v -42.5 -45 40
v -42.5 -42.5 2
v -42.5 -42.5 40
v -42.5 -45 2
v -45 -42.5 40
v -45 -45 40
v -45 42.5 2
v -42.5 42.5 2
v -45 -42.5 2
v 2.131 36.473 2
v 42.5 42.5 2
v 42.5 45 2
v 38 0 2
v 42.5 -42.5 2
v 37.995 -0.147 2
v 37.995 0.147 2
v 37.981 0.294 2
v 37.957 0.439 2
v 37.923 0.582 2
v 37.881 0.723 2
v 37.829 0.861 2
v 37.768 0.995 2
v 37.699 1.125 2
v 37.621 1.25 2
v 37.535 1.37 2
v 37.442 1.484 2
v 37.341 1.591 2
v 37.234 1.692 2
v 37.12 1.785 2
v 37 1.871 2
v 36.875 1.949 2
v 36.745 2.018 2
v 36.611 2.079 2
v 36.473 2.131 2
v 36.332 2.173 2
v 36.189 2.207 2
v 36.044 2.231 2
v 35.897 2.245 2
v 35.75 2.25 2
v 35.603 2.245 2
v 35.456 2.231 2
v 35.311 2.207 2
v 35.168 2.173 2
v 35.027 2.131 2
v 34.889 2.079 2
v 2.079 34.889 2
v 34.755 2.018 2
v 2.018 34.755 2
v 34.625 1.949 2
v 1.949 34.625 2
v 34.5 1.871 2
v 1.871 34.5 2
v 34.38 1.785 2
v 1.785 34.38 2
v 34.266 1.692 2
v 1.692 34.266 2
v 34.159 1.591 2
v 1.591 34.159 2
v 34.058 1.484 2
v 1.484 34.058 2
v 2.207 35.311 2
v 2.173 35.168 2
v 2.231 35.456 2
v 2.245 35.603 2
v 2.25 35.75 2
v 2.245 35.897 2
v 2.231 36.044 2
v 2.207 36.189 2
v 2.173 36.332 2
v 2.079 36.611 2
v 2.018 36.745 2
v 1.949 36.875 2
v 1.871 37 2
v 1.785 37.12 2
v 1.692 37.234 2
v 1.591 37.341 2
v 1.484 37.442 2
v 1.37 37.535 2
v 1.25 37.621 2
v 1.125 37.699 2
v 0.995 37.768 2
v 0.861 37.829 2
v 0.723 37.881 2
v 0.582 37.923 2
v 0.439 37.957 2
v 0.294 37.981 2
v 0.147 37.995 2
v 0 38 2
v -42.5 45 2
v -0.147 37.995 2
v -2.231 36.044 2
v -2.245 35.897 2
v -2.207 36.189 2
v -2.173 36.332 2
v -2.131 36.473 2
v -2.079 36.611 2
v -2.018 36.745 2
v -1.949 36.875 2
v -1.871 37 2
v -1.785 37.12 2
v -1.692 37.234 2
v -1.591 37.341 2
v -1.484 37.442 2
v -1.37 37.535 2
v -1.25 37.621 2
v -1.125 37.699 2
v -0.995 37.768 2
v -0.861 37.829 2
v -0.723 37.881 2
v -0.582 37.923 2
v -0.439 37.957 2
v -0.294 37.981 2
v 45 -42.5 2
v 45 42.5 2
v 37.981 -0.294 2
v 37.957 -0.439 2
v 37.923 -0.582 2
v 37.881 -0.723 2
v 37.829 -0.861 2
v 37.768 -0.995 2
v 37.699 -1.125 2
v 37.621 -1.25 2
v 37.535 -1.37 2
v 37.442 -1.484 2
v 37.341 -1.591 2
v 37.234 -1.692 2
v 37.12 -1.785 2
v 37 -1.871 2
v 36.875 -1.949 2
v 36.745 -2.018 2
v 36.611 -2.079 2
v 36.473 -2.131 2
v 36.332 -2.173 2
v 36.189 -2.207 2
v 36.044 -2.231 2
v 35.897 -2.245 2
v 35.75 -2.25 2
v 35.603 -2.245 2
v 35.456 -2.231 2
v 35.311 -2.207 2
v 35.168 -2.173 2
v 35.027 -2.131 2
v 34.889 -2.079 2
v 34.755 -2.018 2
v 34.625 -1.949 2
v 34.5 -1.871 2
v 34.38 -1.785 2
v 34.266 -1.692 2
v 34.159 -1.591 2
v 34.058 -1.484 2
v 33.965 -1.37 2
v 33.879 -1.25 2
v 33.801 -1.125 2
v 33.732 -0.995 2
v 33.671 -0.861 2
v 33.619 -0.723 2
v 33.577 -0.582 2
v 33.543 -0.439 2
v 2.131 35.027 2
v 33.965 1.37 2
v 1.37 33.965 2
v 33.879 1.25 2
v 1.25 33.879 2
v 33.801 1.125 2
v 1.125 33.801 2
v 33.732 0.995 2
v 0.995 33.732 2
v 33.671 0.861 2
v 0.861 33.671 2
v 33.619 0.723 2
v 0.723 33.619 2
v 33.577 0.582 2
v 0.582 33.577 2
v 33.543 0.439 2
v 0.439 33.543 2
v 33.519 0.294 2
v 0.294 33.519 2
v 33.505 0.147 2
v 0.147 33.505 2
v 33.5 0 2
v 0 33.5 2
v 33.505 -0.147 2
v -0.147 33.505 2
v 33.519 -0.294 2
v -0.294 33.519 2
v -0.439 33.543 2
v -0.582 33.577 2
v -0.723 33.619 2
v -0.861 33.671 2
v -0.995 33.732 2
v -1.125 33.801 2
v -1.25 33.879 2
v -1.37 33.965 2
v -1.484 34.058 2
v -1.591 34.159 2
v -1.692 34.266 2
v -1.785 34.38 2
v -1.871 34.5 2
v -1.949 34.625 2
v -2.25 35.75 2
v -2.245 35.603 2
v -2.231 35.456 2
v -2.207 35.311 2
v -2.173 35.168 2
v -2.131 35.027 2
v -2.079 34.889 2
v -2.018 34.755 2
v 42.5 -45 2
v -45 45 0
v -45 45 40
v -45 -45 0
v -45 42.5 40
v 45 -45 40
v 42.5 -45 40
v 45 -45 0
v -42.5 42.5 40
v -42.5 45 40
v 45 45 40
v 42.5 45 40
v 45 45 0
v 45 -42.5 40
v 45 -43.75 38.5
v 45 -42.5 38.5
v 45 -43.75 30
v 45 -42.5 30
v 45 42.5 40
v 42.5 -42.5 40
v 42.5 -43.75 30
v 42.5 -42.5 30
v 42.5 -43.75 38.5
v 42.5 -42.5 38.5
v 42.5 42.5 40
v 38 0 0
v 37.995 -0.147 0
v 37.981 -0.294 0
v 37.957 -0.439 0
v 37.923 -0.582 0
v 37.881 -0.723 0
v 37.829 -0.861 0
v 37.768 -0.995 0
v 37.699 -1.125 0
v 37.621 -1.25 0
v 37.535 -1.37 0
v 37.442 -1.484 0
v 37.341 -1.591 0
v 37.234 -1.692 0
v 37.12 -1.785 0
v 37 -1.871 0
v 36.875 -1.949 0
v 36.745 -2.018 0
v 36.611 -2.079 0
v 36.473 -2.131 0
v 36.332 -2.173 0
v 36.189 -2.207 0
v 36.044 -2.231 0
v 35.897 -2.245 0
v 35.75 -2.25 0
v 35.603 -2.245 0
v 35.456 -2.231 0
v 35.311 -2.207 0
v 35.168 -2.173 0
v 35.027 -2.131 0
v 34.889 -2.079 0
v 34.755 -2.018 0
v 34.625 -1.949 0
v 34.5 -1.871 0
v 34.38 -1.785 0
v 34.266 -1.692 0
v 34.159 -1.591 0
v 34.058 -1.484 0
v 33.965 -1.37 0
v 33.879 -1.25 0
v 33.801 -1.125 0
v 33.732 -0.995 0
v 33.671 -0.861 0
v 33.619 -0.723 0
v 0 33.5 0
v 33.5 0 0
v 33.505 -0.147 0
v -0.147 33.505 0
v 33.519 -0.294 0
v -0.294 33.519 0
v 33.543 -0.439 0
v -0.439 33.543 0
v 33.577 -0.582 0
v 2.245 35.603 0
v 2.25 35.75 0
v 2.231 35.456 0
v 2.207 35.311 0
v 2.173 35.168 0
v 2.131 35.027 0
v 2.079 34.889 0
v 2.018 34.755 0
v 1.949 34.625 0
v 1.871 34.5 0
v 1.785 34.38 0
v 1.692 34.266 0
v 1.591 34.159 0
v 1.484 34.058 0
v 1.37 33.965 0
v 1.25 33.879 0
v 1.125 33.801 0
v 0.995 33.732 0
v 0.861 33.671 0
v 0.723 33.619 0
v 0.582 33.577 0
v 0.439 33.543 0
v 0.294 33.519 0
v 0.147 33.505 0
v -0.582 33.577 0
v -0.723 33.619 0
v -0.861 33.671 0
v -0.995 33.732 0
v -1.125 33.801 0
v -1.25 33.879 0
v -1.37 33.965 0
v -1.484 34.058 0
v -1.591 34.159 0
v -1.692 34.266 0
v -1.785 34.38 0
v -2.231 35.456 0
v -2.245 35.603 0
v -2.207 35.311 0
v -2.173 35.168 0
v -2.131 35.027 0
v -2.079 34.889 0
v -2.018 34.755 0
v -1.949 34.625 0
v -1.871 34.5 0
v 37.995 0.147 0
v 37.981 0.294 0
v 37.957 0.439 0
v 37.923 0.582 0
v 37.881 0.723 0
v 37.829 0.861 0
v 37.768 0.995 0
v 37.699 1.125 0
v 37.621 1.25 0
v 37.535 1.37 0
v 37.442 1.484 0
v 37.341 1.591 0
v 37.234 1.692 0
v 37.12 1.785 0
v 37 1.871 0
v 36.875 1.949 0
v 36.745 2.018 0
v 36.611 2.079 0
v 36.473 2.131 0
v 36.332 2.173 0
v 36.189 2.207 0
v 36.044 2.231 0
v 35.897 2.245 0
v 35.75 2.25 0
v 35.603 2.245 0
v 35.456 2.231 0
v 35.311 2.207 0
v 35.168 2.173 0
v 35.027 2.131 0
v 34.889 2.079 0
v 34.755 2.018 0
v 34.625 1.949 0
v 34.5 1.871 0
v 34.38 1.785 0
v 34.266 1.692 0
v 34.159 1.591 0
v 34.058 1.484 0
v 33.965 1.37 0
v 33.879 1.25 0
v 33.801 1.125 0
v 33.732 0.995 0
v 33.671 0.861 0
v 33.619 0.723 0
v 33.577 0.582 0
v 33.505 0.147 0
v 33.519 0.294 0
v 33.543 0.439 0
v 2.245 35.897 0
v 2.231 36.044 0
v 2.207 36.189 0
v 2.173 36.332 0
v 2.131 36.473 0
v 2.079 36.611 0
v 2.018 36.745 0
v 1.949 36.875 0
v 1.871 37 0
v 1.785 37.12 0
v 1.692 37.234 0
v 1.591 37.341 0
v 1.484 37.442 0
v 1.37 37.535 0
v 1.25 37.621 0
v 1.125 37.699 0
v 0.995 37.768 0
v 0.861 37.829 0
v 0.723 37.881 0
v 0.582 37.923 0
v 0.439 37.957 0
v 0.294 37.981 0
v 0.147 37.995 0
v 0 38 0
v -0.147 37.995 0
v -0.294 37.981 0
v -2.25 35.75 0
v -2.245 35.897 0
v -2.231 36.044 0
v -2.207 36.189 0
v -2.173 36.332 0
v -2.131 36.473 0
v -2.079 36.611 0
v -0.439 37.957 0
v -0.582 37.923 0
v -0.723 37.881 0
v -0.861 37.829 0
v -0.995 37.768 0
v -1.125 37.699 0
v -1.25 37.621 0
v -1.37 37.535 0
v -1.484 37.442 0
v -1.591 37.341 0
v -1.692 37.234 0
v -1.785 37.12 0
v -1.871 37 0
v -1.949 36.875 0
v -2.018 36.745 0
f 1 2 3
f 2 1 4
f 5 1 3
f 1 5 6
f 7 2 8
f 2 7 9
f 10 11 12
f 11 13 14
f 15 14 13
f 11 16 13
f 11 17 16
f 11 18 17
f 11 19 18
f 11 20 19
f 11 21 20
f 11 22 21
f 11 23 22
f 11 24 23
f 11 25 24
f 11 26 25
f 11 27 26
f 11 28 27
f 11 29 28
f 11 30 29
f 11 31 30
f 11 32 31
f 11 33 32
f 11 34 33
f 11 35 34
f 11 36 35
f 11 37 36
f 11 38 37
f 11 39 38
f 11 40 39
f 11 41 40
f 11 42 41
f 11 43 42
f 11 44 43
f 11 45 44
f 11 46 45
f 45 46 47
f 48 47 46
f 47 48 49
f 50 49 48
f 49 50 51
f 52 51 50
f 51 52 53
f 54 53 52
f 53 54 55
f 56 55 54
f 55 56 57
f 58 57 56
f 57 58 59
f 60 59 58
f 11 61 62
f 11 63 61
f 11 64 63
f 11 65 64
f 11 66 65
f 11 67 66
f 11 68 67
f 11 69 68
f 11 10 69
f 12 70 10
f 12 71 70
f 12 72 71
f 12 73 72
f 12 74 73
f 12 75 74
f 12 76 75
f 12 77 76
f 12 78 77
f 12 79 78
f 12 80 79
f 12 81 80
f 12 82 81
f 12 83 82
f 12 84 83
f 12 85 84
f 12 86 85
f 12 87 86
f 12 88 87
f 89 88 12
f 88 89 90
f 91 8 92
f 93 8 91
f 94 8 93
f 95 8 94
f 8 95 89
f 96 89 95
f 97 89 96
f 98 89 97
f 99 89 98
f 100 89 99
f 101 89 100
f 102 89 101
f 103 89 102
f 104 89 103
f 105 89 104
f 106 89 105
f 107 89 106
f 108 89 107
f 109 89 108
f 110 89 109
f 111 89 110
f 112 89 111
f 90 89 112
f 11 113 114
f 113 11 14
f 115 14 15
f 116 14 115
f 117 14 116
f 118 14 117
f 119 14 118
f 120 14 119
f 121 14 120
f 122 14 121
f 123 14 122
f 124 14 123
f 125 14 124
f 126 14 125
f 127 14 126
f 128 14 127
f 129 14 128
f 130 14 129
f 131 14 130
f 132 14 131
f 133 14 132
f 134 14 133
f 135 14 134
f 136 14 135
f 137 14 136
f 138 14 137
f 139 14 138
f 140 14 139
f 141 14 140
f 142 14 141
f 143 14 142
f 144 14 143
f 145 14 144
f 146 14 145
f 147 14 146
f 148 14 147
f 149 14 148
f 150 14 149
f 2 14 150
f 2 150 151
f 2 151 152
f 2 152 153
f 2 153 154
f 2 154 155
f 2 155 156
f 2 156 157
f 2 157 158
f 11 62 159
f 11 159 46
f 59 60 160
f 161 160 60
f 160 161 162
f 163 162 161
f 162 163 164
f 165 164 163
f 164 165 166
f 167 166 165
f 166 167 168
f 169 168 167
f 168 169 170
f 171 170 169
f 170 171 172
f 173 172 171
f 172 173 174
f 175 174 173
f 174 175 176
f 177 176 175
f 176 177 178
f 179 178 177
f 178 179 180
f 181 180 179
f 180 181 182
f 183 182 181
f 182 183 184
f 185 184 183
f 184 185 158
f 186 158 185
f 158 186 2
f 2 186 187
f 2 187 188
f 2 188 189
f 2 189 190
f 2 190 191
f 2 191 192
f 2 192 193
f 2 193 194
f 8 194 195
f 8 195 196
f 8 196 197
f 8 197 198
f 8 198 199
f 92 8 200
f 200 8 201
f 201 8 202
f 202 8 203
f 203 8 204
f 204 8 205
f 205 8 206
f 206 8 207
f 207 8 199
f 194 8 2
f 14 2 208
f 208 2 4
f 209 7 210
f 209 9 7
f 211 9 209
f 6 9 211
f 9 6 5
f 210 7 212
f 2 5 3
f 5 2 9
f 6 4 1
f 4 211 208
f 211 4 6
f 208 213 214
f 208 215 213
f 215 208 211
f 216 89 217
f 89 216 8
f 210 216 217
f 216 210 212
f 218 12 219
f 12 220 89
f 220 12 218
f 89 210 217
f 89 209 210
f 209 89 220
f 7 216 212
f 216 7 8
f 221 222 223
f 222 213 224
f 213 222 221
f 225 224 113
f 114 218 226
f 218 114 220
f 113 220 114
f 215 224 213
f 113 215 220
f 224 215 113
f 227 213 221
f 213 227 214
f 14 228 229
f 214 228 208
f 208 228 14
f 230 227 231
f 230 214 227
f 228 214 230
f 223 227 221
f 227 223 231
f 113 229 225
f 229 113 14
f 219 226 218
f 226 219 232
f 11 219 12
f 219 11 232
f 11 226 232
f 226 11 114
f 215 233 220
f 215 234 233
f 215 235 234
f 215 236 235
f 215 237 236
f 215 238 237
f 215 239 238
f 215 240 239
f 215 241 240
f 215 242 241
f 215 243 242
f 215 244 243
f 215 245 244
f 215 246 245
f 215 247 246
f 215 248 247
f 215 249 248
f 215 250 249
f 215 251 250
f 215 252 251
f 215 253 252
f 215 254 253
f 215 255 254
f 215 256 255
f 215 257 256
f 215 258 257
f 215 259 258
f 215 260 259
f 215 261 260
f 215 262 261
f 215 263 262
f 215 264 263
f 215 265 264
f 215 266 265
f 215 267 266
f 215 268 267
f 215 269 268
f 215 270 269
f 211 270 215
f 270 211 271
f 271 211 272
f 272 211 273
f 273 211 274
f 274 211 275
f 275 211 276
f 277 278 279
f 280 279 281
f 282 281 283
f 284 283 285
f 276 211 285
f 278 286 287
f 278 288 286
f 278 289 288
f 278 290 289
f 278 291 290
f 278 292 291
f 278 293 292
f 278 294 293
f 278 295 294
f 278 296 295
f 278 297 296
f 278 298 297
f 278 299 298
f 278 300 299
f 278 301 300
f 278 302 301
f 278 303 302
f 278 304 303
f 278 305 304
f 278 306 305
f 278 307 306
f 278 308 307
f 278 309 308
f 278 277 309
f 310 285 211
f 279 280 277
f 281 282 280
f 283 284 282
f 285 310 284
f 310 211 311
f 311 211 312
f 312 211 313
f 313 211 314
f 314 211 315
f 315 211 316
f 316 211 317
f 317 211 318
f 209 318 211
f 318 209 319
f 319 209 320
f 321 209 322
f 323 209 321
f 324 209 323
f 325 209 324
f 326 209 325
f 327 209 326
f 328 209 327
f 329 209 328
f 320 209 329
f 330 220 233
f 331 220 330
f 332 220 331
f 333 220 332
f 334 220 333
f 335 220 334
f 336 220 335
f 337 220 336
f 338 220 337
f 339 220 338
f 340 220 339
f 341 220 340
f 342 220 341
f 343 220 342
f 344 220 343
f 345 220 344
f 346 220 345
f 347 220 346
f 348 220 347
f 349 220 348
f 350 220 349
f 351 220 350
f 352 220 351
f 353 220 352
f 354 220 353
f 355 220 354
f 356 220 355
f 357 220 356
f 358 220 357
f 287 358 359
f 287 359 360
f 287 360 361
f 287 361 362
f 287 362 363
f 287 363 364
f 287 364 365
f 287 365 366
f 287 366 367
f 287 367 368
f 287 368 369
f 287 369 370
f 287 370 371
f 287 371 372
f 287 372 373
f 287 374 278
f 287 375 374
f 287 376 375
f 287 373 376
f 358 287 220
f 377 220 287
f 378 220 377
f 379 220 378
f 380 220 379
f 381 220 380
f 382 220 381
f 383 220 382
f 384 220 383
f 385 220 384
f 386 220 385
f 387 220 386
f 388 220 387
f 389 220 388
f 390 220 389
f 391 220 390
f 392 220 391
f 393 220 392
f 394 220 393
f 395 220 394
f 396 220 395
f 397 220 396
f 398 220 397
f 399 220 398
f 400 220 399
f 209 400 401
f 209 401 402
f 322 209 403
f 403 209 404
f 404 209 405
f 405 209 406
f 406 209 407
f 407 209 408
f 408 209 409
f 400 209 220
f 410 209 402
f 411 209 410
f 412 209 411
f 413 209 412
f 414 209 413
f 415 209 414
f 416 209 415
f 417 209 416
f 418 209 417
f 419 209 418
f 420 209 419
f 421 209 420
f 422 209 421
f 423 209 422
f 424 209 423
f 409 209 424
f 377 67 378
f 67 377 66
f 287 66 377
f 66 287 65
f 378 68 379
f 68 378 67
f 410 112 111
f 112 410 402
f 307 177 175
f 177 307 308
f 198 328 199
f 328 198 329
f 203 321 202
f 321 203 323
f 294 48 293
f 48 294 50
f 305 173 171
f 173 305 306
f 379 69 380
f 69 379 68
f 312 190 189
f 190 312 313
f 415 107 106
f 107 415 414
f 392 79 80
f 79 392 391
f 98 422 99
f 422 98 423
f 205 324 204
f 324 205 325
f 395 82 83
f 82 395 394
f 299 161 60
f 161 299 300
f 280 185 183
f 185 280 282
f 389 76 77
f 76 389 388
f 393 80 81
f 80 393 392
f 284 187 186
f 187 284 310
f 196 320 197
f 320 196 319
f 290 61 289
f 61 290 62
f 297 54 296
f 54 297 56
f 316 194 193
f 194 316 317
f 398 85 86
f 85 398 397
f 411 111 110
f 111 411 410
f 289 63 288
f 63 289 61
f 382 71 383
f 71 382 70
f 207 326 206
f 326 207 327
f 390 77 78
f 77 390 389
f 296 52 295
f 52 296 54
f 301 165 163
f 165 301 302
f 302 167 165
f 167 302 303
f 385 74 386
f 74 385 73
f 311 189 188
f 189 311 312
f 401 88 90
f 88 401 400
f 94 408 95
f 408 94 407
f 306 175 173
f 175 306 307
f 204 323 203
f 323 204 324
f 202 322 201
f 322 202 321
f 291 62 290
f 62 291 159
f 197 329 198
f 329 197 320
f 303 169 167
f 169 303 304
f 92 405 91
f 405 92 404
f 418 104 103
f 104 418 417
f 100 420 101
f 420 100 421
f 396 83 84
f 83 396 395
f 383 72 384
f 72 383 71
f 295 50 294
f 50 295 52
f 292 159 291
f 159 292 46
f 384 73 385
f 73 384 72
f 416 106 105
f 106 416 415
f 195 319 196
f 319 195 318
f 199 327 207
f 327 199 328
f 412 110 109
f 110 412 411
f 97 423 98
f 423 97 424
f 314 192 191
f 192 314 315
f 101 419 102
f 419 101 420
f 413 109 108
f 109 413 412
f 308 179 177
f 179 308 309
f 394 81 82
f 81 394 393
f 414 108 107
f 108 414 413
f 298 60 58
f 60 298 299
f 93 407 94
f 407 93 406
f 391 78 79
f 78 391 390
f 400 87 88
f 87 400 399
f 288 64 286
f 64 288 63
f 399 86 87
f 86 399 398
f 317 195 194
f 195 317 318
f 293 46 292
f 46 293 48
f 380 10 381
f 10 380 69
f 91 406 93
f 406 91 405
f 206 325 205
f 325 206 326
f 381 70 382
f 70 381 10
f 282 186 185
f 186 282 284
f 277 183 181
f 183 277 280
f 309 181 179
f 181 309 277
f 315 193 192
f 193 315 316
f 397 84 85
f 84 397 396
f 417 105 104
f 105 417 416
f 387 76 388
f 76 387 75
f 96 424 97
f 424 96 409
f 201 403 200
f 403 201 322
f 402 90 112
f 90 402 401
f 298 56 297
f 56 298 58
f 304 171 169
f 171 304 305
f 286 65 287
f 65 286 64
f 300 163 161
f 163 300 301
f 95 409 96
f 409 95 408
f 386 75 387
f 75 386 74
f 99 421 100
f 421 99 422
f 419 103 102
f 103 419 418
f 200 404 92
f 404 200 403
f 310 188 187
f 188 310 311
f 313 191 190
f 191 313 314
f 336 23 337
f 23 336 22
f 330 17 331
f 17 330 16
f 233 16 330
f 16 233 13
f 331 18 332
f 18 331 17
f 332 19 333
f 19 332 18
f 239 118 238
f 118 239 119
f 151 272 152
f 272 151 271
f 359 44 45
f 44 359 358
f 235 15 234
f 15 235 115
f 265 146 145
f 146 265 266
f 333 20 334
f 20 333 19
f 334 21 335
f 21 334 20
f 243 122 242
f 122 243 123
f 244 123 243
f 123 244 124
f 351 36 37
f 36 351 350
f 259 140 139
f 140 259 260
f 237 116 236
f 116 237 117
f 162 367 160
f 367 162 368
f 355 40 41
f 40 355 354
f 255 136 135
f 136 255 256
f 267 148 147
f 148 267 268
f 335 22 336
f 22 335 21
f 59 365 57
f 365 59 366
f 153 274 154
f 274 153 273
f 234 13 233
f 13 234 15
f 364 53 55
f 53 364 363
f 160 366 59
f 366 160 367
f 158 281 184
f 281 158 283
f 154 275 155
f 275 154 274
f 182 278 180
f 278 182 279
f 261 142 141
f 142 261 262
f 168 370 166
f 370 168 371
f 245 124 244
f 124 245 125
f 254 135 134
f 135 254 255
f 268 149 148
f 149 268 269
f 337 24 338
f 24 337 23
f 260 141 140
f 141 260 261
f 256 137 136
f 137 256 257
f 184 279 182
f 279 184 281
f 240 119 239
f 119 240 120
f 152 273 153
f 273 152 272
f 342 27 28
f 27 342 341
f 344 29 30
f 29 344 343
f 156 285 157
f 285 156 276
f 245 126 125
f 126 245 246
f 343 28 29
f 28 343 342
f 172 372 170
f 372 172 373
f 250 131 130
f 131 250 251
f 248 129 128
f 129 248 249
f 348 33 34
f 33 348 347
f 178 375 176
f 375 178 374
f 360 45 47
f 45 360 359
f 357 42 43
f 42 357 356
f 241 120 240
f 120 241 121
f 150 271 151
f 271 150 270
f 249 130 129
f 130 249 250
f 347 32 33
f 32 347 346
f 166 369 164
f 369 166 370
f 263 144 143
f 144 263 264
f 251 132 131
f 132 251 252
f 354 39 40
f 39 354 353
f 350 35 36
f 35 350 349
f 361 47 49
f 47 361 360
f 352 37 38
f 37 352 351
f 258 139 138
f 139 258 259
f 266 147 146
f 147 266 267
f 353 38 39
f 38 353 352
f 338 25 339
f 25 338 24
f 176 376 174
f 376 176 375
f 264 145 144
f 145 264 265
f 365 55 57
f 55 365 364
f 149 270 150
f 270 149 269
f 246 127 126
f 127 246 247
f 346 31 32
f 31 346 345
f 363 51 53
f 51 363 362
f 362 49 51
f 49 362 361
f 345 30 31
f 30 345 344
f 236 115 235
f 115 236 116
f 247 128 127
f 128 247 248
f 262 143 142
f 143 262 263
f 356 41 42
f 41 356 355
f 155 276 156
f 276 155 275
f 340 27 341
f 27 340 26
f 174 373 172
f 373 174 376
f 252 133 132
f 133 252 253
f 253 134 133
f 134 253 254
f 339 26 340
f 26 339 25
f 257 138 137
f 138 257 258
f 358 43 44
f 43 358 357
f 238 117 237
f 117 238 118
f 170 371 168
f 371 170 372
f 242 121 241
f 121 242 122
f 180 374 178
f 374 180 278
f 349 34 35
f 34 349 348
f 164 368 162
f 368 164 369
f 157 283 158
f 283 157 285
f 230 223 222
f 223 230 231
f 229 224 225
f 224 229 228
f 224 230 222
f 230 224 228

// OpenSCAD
// DIY magnetic stirrer housing for 80 mm PC case fan
// Print orientation: upside-down open box, top plate on bed (z = 0 to 2)

// ---------- Parameters ----------
top_thickness      = 2;     // top plate thickness
wall_thickness     = 2.5;   // wall thickness
box_height         = 40;    // total height of walls (z = 0 to 40)
outer_size         = 90;    // outer X and Y size of box
screw_hole_d       = 4.5;   // M4 screw hole diameter
screw_hole_count   = 4;     // number of screw holes
screw_hole_pitch   = 71.5;  // square pattern size for holes
cable_notch_w      = 12;    // cable notch width
cable_notch_depth  = 8;     // notch depth from open edge (z = 32 to 40)
eps                = 0.5;   // overcut for clean differences
$fn                = 96;    // curve resolution

// ---------- Model ----------
difference() {
    union() {
        // Top plate
        translate([-outer_size/2, -outer_size/2, 0])
            cube([outer_size, outer_size, top_thickness]);

        // Walls, open top
        for (sx = [-1, 1], sy = [-1, 1])
            translate([sx > 0 ? outer_size/2 - wall_thickness : -outer_size/2,
                       sy > 0 ? outer_size/2 - wall_thickness : -outer_size/2,
                       top_thickness])
                cube([wall_thickness, wall_thickness, box_height - top_thickness]);
    }

    // Screw holes through top plate
    for (i = [0 : screw_hole_count - 1]) {
        a = i < 2 ? 0 : screw_hole_pitch;
        b = i < 2 ? screw_hole_pitch : 0;
        translate([a/2, b/2, -eps])
            cylinder(d = screw_hole_d, h = top_thickness + 2*eps);
    }

    // Cable notch in one wall (from z = 32 to 40)
    translate([outer_size/2 - wall_thickness - cable_notch_w/2,
               -outer_size/2 + wall_thickness/2,
               box_height - top_thickness - cable_notch_depth])
        cube([cable_notch_w, wall_thickness, cable_notch_depth + eps]);
}
